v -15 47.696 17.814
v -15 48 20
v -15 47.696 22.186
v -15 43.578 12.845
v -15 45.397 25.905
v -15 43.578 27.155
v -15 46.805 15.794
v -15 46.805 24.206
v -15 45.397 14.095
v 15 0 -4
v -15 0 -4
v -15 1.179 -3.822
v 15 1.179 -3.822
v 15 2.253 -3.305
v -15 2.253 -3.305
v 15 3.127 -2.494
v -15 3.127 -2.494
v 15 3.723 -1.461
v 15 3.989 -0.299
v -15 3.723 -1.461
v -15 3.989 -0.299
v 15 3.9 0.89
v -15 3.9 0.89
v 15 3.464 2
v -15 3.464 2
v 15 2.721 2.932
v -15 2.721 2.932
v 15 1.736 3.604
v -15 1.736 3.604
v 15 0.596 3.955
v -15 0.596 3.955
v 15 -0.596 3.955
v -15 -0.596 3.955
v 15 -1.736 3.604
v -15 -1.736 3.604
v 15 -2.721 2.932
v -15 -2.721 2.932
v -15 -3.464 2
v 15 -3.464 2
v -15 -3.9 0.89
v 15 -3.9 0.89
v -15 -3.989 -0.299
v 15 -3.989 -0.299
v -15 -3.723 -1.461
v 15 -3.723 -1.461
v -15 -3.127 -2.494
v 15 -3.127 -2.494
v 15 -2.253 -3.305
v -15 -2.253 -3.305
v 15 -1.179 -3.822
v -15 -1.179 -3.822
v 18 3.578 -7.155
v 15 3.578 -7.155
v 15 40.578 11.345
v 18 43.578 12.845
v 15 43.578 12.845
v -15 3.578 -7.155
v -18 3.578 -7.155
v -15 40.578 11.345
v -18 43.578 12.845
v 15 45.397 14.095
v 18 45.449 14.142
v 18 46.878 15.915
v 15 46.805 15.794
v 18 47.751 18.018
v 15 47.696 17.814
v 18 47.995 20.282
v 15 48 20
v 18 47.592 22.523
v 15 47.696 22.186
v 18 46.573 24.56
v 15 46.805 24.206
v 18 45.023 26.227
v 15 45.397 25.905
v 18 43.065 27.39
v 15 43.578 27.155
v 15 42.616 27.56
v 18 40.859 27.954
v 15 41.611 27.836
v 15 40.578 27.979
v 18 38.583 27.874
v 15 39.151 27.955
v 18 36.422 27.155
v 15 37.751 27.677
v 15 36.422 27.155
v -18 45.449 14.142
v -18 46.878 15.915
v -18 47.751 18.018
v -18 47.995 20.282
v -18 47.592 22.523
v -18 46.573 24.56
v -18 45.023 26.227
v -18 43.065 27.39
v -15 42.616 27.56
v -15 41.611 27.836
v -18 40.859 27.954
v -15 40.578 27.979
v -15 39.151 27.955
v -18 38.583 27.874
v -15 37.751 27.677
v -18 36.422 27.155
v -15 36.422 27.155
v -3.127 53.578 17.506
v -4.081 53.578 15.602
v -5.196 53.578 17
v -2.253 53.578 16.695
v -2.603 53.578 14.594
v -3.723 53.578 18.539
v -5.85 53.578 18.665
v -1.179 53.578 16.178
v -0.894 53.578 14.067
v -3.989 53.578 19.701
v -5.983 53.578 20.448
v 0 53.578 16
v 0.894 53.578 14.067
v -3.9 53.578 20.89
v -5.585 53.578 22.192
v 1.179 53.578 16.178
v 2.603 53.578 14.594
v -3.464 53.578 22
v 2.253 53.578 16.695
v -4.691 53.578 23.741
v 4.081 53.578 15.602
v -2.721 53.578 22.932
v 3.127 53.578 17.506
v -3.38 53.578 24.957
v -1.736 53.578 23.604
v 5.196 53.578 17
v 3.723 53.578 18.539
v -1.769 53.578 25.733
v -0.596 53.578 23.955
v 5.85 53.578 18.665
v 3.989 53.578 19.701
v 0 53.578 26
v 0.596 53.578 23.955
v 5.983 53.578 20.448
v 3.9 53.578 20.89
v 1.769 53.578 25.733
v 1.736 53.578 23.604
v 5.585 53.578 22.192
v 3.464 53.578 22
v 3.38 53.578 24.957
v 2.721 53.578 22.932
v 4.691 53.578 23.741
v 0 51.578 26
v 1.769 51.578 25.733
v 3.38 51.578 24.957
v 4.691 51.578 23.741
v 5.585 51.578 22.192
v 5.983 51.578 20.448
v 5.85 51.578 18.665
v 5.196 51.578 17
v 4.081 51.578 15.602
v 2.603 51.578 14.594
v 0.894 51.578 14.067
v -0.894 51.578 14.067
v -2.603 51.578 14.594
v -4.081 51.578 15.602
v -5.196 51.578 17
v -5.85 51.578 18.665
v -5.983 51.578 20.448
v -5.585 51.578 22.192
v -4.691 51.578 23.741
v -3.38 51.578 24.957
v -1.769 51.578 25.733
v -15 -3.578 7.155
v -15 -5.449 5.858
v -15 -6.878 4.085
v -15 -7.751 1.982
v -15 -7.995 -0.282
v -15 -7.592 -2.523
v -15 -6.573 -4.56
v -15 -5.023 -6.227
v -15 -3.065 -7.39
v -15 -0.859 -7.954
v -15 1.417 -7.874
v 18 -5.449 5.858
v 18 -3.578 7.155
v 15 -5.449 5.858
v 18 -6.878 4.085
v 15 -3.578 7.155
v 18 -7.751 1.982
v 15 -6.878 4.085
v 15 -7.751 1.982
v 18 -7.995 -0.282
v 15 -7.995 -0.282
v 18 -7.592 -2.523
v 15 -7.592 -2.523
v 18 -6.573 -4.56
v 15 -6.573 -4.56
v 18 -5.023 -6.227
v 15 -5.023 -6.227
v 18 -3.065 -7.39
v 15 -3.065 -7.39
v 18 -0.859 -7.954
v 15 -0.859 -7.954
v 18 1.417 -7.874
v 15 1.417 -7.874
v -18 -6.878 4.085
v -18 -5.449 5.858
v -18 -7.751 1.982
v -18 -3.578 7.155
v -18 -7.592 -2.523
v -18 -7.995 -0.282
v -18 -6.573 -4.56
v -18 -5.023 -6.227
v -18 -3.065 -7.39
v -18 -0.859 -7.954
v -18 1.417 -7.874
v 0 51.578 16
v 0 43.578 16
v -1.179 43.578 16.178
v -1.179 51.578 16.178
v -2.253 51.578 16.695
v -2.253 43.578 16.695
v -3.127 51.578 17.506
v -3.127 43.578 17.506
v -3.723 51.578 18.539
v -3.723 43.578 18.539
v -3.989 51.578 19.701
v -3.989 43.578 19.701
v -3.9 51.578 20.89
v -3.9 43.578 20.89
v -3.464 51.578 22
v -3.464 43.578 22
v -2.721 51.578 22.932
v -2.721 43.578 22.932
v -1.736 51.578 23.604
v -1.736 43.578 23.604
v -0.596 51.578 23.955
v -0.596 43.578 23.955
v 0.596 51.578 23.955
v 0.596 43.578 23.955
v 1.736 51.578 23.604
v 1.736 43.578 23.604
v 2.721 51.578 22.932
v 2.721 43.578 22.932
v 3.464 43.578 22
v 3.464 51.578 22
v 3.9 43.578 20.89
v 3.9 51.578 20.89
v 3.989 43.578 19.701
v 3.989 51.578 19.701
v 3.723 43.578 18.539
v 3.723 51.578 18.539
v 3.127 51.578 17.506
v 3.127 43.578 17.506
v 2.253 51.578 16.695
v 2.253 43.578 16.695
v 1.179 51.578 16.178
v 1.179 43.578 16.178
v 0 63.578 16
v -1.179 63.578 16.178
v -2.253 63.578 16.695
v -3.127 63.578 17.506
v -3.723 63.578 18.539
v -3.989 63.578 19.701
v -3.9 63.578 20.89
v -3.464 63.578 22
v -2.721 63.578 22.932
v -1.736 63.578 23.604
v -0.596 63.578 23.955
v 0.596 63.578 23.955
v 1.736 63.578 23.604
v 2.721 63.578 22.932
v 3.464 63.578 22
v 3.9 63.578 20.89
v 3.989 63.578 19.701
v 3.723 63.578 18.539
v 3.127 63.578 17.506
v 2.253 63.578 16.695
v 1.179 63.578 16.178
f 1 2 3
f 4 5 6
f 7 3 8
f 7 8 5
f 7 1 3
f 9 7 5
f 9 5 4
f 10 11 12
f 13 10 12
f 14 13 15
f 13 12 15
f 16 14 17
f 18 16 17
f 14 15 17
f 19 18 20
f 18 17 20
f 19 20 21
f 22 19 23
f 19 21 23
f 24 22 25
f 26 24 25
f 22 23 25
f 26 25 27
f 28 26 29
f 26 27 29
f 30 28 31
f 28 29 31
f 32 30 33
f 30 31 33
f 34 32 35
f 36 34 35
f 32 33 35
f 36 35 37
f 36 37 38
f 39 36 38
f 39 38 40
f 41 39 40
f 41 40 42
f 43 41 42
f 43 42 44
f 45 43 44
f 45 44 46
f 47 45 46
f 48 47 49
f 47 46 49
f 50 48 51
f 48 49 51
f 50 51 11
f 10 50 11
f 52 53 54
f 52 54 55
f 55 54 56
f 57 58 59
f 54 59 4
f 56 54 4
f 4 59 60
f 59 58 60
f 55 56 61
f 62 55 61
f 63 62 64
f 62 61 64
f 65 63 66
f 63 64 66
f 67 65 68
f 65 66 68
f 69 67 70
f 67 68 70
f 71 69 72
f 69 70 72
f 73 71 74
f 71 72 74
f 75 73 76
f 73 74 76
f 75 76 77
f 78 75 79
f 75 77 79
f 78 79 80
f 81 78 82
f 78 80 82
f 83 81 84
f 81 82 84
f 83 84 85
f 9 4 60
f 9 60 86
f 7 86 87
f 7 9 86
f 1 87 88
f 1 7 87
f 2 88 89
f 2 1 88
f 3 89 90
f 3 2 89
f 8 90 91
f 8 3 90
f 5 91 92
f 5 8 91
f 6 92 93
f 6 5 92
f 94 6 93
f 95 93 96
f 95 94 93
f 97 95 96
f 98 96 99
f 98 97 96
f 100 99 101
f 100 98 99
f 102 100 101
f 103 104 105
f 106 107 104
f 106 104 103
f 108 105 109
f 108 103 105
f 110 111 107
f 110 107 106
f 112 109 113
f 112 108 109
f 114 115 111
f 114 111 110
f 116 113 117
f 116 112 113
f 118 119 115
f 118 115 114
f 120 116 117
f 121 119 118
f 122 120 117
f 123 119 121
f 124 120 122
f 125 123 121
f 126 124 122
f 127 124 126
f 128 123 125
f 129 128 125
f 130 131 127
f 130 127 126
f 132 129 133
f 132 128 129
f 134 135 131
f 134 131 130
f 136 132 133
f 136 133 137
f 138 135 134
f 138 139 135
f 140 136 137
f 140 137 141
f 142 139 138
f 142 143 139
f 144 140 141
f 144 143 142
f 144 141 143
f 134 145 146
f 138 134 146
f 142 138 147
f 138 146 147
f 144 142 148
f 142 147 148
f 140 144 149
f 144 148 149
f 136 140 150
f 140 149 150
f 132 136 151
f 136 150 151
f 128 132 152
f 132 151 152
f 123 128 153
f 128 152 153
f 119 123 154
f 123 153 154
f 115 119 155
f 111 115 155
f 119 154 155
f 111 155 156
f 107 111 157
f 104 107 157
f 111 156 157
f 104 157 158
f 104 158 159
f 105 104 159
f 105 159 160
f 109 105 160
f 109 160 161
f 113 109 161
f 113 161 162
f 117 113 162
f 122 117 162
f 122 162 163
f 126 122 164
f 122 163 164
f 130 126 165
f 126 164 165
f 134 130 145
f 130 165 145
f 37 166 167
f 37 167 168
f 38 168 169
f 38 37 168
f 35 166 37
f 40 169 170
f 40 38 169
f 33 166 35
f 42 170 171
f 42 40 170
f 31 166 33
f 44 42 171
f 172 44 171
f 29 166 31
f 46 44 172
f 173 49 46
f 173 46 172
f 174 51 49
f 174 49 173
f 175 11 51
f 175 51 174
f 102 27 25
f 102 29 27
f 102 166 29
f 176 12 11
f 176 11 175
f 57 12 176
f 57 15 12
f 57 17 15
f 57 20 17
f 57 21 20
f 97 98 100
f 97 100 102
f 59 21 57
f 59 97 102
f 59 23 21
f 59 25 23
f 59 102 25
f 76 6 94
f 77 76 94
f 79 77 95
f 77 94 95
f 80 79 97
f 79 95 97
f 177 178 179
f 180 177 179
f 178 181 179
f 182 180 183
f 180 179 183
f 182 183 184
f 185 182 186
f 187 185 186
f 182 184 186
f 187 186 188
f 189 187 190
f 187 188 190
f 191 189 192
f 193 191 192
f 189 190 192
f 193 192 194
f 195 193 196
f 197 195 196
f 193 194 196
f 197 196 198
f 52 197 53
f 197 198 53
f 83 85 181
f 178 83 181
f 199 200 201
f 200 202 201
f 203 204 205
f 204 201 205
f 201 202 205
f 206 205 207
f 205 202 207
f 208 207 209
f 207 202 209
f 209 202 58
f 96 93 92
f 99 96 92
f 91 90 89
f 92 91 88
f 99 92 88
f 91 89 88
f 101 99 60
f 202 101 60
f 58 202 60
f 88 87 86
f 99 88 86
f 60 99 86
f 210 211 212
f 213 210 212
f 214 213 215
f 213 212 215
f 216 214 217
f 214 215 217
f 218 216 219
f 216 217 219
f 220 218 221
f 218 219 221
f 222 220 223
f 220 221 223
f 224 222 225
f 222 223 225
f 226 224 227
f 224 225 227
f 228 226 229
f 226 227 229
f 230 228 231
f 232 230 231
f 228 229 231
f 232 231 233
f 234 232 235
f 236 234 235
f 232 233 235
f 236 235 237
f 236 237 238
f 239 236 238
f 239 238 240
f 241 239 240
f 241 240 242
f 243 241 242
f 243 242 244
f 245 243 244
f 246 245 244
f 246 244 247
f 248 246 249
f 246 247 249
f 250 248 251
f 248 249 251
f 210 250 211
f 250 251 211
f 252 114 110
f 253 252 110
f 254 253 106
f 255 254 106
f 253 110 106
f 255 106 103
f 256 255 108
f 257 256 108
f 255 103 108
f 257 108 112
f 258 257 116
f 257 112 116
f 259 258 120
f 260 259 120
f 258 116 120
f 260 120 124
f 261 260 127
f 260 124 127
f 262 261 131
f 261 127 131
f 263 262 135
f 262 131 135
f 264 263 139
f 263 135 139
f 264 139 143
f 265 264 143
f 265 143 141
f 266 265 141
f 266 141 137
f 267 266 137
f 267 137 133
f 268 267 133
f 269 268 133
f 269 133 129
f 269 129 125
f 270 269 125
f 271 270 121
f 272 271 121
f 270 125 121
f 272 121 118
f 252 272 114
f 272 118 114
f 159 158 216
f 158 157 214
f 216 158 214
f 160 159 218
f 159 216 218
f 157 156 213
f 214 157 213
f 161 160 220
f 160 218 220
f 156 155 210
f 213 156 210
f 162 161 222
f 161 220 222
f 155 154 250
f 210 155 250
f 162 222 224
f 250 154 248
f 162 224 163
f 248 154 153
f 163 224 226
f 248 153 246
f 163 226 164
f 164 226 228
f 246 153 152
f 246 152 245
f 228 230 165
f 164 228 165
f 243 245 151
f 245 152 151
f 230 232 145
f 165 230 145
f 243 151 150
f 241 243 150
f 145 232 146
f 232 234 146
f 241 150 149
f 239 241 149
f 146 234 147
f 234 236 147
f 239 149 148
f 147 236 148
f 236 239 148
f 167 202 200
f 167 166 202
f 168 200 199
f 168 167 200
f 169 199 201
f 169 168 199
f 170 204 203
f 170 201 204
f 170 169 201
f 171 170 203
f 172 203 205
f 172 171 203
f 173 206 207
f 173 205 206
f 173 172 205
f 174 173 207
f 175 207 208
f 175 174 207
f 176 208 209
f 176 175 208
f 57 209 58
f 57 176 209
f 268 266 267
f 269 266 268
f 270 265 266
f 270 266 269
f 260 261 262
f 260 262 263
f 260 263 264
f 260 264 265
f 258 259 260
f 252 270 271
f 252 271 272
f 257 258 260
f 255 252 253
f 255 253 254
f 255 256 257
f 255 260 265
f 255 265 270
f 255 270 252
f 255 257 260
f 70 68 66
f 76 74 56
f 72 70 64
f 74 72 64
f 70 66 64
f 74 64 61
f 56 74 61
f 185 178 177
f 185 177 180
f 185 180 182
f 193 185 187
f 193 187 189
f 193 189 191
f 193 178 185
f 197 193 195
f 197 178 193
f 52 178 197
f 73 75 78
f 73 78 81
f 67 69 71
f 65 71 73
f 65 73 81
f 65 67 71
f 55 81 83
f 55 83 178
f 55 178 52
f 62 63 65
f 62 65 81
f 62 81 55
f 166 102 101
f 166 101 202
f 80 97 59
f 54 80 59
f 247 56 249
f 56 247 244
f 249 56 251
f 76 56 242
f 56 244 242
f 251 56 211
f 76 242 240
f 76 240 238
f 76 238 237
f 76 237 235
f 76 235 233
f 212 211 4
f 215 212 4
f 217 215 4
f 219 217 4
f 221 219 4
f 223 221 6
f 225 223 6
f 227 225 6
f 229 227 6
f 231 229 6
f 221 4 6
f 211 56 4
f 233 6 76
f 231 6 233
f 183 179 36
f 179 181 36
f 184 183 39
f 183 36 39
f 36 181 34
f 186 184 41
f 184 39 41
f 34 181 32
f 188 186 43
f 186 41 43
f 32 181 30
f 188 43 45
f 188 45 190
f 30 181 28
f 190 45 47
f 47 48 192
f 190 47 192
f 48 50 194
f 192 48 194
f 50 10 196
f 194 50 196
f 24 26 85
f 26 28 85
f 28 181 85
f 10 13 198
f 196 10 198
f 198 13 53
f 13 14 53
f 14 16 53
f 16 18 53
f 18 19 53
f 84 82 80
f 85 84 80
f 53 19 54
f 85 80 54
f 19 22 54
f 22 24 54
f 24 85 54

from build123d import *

# Parameters (mm, degrees)
EXTRUDE_1_DEPTH      = 15
EXTRUDE_1_DEPTH_BACK = 15
SKETCH_1_R           = 4
SKETCH_2_R           = 8
SKETCH_2_R_2         = 4
EXTRUDE_3_DEPTH      = 3
EXTRUDE_4_DEPTH      = 30
SKETCH_4_R           = 4
EXTRUDE_5_DEPTH      = 8
SKETCH_5_R           = 6
EXTRUDE_6_DEPTH      = 2
SKETCH_6_R           = 4
EXTRUDE_7_DEPTH      = 10


with BuildPart() as part:
    # 草图1 → 凸台-拉伸1 (new, two sides: drawn at the far end of the back side and taken through both)
    with BuildSketch(Plane(origin=(0, 0, 0), x_dir=(0, 0, -1), z_dir=(1, 0, 0)).offset(-EXTRUDE_1_DEPTH_BACK)):
        Circle(SKETCH_1_R)
    extrude(amount=EXTRUDE_1_DEPTH + EXTRUDE_1_DEPTH_BACK)

    # 草图2 → 凸台-拉伸3 (add)
    # profile 1 of 4: a face of its own
    with BuildSketch(Plane(origin=(15, 0, 0), x_dir=(0, 0, -1), z_dir=(1, 0, 0))):
        with Locations((-20, 40)):
            Circle(SKETCH_2_R)
    # profile 2 of 4: a face of its own
    with BuildSketch(Plane(origin=(15, 0, 0), x_dir=(0, 0, -1), z_dir=(1, 0, 0))):
        Circle(SKETCH_2_R)
        Circle(SKETCH_2_R_2, mode=Mode.SUBTRACT)
    # profile 3 of 4: a face of its own
    with BuildSketch(Plane(origin=(15, 0, 0), x_dir=(0, 0, -1), z_dir=(1, 0, 0))):
        Circle(SKETCH_2_R_2)
    # profile 4 of 4: a face of its own
    with BuildSketch(Plane(origin=(15, 0, 0), x_dir=(0, 0, -1), z_dir=(1, 0, 0))):
        with BuildLine():
            ThreePointArc((-12, 40), (-18.161976636, 32.214008084), (-27.155417528, 36.422291236))
            Line((-27.155417528, 36.422291236), (-7.155417528, -3.577708764))
            ThreePointArc((-7.155417528, -3.577708764), (-3.577708764, 7.155417528), (7.155417528, 3.577708764))
            Line((7.155417528, 3.577708764), (-12.844582472, 43.577708764))
            ThreePointArc((-12.844582472, 43.577708764), (-12.214008084, 41.838023364), (-12, 40))
        make_face()
    extrude_3 = extrude(amount=EXTRUDE_3_DEPTH)

    # 镜向2: 凸台-拉伸3 across plane
    add(extrude_3.mirror(Plane(origin=(0, 0, 0), x_dir=(0, 0, 1), z_dir=(1, 0, 0))))

    # 草图3 → 凸台-拉伸4 (add)
    with BuildSketch(Plane(origin=(-15, 0, 0), x_dir=(0, 0, -1), z_dir=(1, 0, 0))):
        with BuildLine():
            Line((-11.344582472, 40.577708764), (-12.844582472, 43.577708764))
            Line((-12.844582472, 43.577708764), (-27.155417528, 43.577708764))
            ThreePointArc((-27.155417528, 43.577708764), (-27.714499823, 42.118134198), (-27.979113521, 40.577708764))
            Line((-27.979113521, 40.577708764), (-11.344582472, 40.577708764))
        make_face()
    extrude(amount=EXTRUDE_4_DEPTH)

    # 草图4 → 凸台-拉伸5 (add)
    with BuildSketch(Plane(origin=(0, 43.577708764, 0), x_dir=(1, 0, 0), z_dir=(0, 1, 0))):
        with Locations(Location((0, -20, 0), (0, 0, 90))):
            Circle(SKETCH_4_R)
    extrude(amount=EXTRUDE_5_DEPTH)

    # 草图5 → 凸台-拉伸6 (add)
    with BuildSketch(Plane(origin=(0, 51.577708764, 0), x_dir=(1, 0, 0), z_dir=(0, 1, 0))):
        with Locations(Location((0, -20, 0), (0, 0, 270))):
            Circle(SKETCH_5_R)
    extrude(amount=EXTRUDE_6_DEPTH)

    # 草图6 → 凸台-拉伸7 (add)
    with BuildSketch(Plane(origin=(0, 53.577708764, 0), x_dir=(1, 0, 0), z_dir=(0, 1, 0))):
        with Locations(Location((0, -20, 0), (0, 0, 90))):
            Circle(SKETCH_6_R)
    extrude(amount=EXTRUDE_7_DEPTH)


solid = part.part
